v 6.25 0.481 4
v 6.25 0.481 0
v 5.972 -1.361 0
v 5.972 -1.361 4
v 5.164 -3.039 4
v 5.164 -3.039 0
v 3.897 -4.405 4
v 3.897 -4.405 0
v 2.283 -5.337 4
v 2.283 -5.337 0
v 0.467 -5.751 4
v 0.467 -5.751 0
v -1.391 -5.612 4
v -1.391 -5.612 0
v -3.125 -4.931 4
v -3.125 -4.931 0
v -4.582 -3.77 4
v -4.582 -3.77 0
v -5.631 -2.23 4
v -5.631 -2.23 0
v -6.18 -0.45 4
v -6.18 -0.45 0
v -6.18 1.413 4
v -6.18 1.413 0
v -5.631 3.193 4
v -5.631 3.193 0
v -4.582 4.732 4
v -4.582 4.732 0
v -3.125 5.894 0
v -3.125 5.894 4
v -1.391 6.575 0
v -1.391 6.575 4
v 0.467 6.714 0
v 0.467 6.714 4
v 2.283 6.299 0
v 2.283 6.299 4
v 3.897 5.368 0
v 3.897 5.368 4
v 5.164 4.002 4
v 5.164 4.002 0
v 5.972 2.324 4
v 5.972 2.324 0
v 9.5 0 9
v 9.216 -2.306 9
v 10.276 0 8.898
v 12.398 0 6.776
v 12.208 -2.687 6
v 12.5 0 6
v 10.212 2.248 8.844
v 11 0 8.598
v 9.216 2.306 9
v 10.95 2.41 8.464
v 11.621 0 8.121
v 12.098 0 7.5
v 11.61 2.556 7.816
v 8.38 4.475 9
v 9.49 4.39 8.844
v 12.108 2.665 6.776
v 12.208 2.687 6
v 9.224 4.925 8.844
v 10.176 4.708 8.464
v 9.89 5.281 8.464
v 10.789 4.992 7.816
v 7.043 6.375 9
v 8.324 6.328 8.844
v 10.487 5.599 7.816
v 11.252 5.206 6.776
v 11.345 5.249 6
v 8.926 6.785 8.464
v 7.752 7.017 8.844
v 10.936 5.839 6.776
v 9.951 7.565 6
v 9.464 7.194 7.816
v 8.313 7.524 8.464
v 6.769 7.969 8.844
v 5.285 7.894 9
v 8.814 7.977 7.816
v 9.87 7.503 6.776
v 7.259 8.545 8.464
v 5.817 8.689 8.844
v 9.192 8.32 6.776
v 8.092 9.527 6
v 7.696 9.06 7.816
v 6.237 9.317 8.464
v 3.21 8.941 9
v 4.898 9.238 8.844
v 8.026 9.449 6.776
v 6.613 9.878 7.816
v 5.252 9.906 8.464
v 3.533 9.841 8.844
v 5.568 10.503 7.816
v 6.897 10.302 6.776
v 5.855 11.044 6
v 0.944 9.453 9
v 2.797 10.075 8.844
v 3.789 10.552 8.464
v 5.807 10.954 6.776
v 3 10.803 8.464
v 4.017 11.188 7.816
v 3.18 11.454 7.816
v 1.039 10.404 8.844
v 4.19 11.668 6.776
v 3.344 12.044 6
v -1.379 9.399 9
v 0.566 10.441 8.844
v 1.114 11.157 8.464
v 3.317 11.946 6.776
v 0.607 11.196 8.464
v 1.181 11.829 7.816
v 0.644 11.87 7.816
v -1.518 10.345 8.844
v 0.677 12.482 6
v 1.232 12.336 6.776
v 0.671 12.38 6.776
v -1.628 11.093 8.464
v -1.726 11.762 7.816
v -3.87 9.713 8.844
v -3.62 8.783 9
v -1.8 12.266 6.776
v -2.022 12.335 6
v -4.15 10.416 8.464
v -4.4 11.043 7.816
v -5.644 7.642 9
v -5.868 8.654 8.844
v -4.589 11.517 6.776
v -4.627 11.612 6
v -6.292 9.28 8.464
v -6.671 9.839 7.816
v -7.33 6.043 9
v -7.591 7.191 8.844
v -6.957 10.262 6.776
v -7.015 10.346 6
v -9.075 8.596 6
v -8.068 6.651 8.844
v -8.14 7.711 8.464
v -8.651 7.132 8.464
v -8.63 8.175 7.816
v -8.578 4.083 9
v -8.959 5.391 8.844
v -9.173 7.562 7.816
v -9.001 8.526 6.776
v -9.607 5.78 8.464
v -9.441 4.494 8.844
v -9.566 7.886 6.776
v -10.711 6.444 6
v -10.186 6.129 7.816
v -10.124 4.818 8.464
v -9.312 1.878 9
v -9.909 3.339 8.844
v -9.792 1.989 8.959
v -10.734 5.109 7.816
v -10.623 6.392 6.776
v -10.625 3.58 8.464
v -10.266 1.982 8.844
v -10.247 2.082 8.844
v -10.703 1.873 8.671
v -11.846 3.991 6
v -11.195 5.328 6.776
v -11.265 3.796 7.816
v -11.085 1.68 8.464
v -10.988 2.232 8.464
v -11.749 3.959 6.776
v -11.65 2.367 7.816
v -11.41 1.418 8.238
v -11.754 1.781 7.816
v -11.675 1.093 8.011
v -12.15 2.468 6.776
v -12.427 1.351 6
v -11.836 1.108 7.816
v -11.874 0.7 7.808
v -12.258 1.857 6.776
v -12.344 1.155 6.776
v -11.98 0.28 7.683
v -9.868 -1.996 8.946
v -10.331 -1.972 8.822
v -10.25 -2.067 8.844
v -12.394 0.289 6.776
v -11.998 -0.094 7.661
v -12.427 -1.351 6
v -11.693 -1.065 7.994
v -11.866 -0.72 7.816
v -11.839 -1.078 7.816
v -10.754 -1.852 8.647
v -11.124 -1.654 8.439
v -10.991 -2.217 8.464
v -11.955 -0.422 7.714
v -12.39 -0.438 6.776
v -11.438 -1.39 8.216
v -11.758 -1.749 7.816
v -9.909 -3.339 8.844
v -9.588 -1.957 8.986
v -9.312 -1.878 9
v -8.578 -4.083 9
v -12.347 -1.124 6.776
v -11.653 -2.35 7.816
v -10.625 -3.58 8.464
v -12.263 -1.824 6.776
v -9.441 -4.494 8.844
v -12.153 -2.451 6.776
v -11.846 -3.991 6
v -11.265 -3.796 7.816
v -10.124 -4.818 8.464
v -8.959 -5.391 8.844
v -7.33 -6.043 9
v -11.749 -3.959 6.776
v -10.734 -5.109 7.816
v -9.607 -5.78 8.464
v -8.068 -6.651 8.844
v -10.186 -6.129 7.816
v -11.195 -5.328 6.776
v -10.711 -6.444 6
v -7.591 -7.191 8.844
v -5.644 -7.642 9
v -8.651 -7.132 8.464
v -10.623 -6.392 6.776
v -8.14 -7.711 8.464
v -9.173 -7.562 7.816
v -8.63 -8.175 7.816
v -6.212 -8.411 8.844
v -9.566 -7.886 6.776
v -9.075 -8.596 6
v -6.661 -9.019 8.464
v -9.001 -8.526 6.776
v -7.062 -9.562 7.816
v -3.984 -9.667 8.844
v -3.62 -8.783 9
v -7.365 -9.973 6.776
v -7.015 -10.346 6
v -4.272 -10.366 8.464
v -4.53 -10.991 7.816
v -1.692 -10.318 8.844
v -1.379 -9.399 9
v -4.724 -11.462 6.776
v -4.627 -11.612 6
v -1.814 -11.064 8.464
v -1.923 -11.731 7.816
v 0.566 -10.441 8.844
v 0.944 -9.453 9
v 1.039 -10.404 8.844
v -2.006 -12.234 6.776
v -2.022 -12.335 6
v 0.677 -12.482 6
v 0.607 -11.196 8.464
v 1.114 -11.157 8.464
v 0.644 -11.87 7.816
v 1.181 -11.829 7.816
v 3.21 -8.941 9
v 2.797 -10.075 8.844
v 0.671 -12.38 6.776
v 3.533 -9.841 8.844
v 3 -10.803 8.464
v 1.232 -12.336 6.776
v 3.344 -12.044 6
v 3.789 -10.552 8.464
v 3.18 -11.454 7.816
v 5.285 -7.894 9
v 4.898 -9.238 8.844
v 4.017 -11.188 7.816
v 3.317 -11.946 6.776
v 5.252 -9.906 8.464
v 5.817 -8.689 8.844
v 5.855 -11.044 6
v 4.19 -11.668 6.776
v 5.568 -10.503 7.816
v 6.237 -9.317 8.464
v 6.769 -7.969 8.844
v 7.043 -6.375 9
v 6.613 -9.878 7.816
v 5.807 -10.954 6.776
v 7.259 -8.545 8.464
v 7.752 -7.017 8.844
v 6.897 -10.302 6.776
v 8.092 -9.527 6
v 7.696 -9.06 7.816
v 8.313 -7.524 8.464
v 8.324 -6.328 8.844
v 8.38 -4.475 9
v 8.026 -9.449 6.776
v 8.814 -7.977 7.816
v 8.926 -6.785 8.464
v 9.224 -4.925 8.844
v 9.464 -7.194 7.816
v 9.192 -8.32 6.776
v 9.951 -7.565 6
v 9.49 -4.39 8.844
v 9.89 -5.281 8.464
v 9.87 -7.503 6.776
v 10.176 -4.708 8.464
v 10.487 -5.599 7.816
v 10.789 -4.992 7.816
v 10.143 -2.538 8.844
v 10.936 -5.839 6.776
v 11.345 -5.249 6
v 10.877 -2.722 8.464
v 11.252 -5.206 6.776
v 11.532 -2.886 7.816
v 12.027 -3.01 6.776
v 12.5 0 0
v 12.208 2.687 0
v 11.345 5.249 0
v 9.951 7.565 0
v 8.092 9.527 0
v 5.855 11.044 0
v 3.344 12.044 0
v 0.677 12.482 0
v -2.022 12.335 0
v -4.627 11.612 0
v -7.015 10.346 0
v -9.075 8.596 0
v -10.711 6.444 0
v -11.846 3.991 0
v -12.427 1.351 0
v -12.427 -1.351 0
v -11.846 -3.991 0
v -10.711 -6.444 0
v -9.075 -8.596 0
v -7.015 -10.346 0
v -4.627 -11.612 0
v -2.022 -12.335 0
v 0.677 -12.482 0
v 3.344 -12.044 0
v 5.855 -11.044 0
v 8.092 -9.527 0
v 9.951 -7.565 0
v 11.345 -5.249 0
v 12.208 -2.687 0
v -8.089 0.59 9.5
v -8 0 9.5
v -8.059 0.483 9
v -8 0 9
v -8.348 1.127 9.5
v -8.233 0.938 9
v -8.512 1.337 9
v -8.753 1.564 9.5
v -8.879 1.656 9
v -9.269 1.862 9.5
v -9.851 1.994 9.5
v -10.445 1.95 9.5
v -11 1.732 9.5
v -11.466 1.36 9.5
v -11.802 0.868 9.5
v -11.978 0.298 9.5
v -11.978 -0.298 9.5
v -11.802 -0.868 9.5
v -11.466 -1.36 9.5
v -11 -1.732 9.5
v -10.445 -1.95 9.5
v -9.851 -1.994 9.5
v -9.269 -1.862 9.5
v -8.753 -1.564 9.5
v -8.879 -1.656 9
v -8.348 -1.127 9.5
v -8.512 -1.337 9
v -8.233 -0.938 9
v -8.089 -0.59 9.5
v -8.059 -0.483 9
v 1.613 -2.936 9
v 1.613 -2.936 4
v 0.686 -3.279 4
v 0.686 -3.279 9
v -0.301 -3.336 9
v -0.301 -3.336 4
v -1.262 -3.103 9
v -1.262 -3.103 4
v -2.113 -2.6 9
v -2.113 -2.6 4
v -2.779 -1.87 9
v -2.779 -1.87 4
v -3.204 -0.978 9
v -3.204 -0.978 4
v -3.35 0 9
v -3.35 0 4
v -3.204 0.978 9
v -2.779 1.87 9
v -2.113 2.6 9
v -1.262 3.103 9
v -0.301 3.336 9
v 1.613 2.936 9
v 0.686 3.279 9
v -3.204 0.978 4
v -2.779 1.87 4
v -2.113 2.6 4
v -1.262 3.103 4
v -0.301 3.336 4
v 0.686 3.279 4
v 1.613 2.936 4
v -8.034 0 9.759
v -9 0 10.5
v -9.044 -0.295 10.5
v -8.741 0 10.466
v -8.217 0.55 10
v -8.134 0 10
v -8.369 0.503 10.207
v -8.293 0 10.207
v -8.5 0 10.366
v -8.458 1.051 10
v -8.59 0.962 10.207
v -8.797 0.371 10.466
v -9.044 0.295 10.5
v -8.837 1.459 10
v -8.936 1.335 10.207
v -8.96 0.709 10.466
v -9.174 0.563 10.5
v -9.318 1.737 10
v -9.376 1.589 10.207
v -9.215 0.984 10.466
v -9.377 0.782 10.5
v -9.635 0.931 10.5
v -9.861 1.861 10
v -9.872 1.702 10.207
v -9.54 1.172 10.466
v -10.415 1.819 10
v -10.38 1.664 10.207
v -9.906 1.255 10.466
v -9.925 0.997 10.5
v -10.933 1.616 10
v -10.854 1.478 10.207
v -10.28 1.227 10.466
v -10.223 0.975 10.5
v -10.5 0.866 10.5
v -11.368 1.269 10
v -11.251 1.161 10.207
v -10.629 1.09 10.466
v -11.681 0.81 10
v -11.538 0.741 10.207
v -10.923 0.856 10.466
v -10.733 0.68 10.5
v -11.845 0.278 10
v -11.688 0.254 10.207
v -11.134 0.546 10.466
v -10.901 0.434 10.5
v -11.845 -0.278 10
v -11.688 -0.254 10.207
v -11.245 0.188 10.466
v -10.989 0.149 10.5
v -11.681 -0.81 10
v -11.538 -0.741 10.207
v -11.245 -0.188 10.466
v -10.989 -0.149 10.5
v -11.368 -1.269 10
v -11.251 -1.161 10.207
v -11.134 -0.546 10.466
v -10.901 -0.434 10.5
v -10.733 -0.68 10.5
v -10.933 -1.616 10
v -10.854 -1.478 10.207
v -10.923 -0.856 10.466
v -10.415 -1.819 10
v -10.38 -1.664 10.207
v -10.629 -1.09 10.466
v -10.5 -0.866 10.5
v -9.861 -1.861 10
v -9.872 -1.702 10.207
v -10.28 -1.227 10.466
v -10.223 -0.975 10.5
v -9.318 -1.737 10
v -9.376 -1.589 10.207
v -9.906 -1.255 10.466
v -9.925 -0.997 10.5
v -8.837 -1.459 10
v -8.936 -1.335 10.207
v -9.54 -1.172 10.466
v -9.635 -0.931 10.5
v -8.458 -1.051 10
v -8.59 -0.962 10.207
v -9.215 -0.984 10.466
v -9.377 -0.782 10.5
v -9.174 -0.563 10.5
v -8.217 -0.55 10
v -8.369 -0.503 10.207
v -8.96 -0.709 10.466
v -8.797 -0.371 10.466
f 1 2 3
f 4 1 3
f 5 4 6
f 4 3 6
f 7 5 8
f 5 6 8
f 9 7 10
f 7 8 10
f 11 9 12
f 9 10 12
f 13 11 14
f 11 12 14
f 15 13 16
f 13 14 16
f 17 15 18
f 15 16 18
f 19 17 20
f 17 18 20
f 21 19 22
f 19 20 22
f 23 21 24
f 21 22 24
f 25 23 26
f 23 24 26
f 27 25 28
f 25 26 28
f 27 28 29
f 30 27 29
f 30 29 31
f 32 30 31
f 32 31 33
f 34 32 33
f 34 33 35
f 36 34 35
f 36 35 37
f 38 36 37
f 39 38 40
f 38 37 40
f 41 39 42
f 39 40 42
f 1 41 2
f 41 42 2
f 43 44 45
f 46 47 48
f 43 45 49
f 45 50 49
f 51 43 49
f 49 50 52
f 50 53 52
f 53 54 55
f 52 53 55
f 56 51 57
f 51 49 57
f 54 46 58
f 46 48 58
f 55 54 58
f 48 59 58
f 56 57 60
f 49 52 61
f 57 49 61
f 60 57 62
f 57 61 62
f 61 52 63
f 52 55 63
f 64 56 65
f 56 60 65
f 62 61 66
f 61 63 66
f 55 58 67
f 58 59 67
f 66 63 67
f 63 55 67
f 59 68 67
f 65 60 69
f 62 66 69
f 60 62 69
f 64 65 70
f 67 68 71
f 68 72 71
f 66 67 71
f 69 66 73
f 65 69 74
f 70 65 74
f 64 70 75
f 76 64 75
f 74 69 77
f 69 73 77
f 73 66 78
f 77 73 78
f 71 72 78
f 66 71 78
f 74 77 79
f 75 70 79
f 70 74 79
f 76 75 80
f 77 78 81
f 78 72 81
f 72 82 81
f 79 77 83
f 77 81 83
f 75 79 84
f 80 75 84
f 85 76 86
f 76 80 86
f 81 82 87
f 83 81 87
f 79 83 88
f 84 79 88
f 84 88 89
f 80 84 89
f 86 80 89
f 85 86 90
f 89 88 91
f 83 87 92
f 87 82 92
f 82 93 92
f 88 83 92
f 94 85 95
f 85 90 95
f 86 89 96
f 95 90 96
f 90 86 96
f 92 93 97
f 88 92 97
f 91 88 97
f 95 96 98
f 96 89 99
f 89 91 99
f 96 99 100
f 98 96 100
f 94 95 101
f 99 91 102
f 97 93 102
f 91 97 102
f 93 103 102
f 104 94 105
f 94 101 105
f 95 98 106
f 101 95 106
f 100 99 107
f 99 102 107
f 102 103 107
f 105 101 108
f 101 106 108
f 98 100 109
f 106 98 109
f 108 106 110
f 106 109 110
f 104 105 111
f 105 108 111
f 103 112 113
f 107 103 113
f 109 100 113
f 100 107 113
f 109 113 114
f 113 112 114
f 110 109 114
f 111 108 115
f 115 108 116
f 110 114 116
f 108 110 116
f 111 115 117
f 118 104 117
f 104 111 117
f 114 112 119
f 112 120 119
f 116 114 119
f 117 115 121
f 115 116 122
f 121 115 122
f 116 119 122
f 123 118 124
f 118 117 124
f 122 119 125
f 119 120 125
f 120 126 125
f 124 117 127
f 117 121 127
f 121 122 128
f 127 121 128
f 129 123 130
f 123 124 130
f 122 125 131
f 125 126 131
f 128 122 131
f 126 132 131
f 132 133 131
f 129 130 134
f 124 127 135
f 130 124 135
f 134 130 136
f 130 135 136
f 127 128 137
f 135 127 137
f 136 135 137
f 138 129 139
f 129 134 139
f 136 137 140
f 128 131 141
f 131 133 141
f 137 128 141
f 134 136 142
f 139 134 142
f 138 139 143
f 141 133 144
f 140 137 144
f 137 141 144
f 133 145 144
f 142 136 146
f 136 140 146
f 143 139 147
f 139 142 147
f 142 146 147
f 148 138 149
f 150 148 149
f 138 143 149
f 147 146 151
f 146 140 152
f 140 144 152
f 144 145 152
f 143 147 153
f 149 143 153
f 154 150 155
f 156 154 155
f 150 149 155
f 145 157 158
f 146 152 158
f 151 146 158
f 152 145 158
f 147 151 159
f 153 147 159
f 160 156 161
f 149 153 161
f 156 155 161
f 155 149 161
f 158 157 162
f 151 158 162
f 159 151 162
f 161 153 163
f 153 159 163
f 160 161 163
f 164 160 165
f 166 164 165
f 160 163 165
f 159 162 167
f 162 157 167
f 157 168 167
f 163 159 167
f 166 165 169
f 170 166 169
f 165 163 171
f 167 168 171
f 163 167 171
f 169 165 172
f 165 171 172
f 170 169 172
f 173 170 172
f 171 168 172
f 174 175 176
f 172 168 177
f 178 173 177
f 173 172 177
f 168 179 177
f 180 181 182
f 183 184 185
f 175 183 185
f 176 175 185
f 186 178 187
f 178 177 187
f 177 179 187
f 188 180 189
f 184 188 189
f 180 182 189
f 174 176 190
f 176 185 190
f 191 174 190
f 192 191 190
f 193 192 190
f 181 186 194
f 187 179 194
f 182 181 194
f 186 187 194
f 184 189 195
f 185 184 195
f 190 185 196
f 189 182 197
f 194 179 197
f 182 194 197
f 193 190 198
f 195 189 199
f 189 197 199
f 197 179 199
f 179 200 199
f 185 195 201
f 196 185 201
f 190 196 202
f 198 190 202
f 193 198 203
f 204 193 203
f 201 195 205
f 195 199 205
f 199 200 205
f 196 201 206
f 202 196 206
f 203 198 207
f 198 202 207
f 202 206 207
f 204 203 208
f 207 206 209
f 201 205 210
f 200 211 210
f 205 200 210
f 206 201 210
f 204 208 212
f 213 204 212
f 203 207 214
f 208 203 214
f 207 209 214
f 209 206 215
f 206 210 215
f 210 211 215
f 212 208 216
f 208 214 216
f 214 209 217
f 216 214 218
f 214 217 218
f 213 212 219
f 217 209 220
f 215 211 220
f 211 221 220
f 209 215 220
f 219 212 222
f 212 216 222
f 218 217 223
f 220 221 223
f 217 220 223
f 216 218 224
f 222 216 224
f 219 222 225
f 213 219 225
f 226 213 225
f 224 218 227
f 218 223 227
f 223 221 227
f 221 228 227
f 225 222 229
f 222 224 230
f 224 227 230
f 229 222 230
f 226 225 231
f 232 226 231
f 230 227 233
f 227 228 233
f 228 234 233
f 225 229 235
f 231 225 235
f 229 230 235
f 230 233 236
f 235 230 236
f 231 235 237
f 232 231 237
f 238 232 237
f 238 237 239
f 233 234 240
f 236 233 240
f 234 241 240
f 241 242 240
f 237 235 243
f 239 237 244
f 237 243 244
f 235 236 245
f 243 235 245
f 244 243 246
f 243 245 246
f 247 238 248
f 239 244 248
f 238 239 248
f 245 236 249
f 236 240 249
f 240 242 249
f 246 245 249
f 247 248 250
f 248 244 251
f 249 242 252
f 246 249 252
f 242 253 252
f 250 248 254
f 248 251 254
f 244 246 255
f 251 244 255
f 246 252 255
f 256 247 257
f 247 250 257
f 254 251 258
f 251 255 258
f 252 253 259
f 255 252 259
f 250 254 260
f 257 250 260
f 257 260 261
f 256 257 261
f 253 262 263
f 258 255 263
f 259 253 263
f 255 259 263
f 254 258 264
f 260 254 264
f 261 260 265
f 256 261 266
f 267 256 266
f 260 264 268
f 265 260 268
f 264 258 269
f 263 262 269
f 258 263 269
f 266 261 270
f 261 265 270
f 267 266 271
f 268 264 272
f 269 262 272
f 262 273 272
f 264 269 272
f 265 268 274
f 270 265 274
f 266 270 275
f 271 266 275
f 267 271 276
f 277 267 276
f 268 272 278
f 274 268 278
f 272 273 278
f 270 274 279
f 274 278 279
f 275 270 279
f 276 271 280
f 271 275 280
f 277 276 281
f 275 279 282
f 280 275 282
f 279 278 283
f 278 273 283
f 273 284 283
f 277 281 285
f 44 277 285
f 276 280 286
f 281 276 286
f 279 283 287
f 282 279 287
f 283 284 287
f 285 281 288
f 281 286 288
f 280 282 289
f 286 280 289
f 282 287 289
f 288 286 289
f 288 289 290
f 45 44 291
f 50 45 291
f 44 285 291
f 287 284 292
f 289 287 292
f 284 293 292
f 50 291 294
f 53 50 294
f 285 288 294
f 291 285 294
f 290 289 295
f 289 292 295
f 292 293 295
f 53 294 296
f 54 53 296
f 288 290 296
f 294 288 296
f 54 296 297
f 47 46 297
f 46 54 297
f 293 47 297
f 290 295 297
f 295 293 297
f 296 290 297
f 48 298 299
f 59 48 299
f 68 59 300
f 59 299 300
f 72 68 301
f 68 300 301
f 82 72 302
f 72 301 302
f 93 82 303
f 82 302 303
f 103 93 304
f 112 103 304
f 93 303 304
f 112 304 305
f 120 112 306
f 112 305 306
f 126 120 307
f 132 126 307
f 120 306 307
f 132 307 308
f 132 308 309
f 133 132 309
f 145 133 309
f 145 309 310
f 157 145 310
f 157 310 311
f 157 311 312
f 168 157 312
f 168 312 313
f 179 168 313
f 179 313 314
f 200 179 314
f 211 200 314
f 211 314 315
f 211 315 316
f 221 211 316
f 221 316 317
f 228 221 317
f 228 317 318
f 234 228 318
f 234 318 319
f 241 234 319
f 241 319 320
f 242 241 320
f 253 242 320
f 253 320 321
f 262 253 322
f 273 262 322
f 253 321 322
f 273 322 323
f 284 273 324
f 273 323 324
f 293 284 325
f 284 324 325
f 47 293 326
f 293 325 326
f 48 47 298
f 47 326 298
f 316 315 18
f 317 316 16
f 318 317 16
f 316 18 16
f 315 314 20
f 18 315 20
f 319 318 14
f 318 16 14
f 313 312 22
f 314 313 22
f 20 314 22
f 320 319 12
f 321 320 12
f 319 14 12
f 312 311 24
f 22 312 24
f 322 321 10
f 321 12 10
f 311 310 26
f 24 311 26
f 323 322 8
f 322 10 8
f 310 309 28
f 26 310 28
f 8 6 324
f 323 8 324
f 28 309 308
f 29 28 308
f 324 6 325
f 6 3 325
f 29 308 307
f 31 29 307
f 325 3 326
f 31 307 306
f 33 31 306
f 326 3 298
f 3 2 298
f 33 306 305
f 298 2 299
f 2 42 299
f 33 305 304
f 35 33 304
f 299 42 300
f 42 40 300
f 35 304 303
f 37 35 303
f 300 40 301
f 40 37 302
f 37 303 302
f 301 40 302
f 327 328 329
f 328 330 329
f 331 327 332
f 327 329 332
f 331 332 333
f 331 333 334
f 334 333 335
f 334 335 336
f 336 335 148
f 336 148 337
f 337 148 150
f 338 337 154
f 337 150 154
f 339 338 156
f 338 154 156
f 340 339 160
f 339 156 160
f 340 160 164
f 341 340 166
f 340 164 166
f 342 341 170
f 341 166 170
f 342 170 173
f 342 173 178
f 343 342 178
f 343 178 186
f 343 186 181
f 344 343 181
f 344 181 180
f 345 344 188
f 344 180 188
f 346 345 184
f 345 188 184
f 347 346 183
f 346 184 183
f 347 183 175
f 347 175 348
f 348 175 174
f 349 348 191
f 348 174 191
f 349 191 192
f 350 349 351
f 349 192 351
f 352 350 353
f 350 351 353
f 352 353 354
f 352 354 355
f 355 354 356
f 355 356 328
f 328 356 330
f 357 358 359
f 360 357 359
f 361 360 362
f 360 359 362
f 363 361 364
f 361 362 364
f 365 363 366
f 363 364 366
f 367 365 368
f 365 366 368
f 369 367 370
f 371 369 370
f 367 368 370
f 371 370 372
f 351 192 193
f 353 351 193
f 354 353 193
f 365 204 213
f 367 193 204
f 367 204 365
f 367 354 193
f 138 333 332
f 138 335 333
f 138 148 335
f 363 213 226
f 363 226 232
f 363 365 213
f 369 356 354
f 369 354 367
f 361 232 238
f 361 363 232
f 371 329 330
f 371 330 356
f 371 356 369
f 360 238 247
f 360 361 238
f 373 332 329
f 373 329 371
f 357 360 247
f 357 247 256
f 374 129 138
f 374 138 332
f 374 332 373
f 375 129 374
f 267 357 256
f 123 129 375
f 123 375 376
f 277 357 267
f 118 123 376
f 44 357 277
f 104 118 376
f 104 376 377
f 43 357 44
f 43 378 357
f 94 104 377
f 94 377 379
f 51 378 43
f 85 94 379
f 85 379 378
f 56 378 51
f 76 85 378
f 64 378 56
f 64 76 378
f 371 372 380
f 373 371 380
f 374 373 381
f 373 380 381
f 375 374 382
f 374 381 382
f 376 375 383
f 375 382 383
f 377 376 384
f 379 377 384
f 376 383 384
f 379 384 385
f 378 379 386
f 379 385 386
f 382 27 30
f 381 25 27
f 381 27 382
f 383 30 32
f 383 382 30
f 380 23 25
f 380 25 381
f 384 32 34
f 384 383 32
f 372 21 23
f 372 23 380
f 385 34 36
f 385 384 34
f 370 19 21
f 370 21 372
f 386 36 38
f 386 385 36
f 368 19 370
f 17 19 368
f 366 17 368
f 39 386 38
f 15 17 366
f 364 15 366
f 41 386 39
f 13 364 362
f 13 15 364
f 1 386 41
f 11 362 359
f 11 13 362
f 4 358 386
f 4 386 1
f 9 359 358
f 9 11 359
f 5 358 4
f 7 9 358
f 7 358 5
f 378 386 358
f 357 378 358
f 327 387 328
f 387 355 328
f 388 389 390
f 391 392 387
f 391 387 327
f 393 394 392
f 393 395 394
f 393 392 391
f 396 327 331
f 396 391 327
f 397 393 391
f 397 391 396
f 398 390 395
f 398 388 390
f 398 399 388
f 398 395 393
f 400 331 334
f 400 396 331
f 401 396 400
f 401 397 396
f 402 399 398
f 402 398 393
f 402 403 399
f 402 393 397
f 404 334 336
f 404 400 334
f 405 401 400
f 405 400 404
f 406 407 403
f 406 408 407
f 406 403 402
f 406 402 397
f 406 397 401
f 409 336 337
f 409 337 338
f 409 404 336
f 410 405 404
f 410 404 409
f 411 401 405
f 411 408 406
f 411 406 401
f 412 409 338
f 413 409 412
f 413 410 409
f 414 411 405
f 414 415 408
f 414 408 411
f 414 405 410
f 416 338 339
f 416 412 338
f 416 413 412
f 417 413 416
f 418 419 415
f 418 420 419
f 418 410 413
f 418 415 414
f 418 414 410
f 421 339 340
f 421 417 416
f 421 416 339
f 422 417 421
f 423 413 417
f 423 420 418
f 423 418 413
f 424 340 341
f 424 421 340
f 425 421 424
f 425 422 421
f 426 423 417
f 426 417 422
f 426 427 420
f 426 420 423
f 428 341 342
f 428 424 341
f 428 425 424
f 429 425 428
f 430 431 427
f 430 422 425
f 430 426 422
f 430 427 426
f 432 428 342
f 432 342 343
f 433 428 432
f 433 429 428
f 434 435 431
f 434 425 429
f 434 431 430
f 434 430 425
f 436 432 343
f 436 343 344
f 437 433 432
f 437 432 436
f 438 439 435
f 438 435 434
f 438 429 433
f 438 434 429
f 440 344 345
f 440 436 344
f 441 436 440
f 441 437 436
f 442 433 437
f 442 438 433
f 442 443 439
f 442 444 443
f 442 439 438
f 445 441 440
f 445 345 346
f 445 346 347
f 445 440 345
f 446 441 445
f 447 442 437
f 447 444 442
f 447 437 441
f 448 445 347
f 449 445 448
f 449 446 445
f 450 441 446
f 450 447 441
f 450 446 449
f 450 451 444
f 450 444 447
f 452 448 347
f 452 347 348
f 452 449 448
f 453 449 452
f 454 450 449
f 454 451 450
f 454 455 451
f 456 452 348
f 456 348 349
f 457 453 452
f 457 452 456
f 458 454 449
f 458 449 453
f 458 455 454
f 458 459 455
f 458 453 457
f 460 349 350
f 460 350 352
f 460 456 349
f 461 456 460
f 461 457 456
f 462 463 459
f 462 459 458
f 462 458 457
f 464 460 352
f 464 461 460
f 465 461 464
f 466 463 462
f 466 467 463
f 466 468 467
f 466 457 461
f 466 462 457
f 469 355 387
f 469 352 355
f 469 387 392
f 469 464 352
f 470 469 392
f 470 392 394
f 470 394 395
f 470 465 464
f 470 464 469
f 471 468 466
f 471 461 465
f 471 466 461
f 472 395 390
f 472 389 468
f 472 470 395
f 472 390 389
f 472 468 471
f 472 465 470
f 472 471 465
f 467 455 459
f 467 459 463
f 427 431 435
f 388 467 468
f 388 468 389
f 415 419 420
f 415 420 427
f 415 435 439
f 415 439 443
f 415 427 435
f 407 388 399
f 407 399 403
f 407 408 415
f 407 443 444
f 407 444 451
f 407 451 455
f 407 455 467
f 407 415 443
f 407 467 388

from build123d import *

# Parameters (mm, degrees)
F0_R        = 12.5
F1_DEPTH    = 9
F2_R        = 6.25
F3_DEPTH    = 4
F4_R        = 2
F5_DEPTH    = 1.5
F6_R        = 1
F7_S5_R     = 2
F7_T6_DEPTH = 21


# Not quite as in the source:
# - a fillet or chamfer that OpenCascade refuses, or shapes differently, is made with other operations: its cross-section is extruded or revolved along the edge and cut away or added


with BuildPart() as f1:
    # F0 (on Top) → F1 (new body)
    with BuildSketch(Plane.XY):
        Circle(F0_R)
        with BuildLine():
            ThreePointArc((-3.35, 0), (-1.7058759905, 2.8831384124), (1.6126788687, 2.9362845343))
            Line((1.6126788687, 2.9362845343), (1.6126788687, 0))
            Line((1.6126788687, 0), (1.6126788687, -2.9362845343))
            ThreePointArc((1.6126788687, -2.9362845343), (-1.7058759905, -2.8831384124), (-3.35, 0))
        make_face(mode=Mode.SUBTRACT)
    extrude(amount=F1_DEPTH)

    # F2 (on face) → F3 (cut)
    with BuildSketch(Plane(origin=(0, 0, 0), x_dir=(1, 0, 0), z_dir=(0, 0, -1))):
        with Locations((0, -0.4813171179)):
            Circle(F2_R)
    extrude(amount=-F3_DEPTH, mode=Mode.SUBTRACT)

    # F4 (on face) → F5 (join)
    with BuildSketch(Plane.XY.offset(9)):
        with Locations((-10, 0)):
            Circle(F4_R)
    extrude(amount=F5_DEPTH)

    # F6
    f6_edges = [f1.edges().sort_by_distance(p)[0] for p in [
        (-12, 0, 10.5),
    ]]
    fillet(f6_edges, radius=F6_R)

    # F7: fillet of radius 3 on 1 edges, made by hand


with BuildPart() as f7_tool2:
    # F7_s3 → F7_t4 (revolve)
    with BuildSketch(Plane.XZ):
        with BuildLine():
            ThreePointArc((9.5, 9), (11.6213203436, 8.1213203436), (12.5, 6))
            Line((12.5, 6), (12.5, 9))
            Line((12.5, 9), (9.5, 9))
        make_face()
    revolve(axis=Axis((0, 0, 9), (0, 0, 1)))

    # F7_s5 → F7_t6 (cut, symmetric)
    with BuildSketch(Plane.XY.offset(6.4)):
        with Locations((-10, 0)):
            Circle(F7_S5_R)
    extrude(amount=F7_T6_DEPTH, both=True, mode=Mode.SUBTRACT)


with BuildPart() as f1_1:
    add(f1.part)

    # F7_t1: cut F7_tool2
    add(f7_tool2.part, mode=Mode.SUBTRACT)


solid = f1_1.part
